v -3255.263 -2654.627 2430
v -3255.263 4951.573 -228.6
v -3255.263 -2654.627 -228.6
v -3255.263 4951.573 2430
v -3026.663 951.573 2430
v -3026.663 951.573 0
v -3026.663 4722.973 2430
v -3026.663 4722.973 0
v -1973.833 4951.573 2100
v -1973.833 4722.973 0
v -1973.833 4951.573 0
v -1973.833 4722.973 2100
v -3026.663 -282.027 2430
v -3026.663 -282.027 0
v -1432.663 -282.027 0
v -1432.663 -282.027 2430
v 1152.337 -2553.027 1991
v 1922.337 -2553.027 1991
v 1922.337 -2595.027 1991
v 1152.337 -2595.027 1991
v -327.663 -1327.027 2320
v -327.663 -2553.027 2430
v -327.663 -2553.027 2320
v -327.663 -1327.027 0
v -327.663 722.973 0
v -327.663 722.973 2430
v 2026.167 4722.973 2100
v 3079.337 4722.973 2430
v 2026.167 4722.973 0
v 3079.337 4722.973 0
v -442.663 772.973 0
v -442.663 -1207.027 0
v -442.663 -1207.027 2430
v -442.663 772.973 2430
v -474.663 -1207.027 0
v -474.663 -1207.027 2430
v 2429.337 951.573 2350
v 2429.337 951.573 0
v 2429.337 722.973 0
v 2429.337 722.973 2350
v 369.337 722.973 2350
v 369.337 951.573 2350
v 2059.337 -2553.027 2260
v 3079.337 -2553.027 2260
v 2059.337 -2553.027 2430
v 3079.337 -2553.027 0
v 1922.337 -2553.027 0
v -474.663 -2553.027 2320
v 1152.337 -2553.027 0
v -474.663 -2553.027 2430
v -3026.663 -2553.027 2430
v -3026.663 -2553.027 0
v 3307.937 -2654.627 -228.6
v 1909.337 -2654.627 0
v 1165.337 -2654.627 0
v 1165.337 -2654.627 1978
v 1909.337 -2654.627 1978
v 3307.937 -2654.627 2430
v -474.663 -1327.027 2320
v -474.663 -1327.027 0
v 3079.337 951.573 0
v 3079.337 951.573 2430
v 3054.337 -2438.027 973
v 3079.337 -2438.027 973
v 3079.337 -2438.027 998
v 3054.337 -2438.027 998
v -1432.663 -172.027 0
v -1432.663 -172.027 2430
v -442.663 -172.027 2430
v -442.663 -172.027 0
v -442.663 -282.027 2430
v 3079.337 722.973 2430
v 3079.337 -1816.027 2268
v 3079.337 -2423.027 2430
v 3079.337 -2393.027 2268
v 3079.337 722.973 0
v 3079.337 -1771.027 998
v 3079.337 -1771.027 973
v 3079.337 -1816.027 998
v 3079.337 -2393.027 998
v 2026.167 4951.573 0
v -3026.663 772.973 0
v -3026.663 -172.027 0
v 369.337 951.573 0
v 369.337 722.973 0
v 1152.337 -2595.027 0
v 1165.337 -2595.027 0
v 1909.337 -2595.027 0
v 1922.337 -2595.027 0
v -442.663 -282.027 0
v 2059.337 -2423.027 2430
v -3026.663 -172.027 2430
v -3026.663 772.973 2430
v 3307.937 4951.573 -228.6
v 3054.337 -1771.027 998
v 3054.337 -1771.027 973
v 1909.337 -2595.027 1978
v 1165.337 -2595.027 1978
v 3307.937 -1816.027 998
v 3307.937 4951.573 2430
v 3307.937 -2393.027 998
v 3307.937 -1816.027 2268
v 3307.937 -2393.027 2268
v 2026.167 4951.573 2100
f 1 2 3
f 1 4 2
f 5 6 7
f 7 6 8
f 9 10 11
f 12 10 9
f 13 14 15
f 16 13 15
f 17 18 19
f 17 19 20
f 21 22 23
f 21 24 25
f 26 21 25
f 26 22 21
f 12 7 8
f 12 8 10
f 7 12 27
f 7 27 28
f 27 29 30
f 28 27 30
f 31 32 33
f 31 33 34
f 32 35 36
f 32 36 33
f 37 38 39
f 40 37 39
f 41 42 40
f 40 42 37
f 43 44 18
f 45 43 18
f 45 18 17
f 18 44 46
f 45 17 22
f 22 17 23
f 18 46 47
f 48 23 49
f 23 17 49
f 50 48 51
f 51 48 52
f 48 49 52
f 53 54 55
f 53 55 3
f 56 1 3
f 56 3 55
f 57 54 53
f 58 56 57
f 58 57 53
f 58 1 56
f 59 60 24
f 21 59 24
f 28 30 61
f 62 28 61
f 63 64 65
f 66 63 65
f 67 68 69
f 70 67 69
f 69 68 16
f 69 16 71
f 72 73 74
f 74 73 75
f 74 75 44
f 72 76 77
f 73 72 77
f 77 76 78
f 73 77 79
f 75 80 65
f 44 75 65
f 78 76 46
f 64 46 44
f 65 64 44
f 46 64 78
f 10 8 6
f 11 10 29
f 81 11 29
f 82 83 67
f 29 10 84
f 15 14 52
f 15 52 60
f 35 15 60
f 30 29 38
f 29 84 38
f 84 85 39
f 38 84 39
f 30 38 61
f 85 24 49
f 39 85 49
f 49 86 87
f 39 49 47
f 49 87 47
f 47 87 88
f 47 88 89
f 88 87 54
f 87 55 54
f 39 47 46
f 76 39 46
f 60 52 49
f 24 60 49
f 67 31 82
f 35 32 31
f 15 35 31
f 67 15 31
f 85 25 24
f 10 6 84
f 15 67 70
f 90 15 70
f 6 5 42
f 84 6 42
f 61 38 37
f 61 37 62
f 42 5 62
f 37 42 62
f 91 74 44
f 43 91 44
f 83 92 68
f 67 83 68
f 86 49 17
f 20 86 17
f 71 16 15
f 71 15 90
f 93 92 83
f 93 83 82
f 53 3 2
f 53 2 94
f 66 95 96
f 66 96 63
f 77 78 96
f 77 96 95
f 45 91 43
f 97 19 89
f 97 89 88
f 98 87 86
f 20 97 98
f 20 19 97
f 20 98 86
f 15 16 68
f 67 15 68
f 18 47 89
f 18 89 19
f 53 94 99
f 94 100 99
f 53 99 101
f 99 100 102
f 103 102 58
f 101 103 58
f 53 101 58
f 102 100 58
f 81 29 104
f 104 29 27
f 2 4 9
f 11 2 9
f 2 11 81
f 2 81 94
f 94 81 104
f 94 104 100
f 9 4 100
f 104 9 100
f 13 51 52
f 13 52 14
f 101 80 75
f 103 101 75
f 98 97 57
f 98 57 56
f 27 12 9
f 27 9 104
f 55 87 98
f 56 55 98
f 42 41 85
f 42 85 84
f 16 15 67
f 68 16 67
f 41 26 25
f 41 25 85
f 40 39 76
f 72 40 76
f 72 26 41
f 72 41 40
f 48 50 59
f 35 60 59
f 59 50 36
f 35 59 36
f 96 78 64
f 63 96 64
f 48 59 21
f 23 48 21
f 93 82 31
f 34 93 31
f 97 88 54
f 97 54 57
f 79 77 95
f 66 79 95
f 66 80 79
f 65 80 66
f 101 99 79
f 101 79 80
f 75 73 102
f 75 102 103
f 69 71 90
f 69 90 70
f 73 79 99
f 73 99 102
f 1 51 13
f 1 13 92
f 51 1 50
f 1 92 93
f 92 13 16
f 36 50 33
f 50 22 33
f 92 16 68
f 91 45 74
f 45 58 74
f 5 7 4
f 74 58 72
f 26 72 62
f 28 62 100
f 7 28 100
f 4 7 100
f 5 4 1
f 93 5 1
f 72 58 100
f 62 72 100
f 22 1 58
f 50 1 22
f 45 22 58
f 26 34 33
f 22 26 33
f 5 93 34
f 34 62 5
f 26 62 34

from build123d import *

# Parameters (mm, degrees)
F0_W      = 1356
F0_H      = 1226
F0_W_2    = 990
F0_H_2    = 1980
F1_DEPTH  = 2430
F2_W      = 147
F2_H      = 1226
F3_DEPTH  = 110
F4_W      = 2060
F4_H      = 228.6
F5_DEPTH  = 80
F6_W      = 577
F6_H      = 1270
F7_DEPTH  = 228.6
F8_W      = 667
F8_H      = 25
F9_DEPTH  = 25
F10_W     = 4000
F10_H     = 2100
F11_DEPTH = 228.6
F12_W     = 744
F12_H     = 1978
F13_DEPTH = 101.6
F14_W     = 770
F14_H     = 1991
F15_DEPTH = 42
F16_W     = 6563.2
F16_H     = 7606.2
F17_DEPTH = 228.6
F19_DEPTH = 1020
F20_W     = 2552
F20_H     = 2271
F21_DEPTH = 2430
F22_W     = 990
F22_H     = 110
F23_DEPTH = 2430
F24_W     = 110
F24_H     = 945
F25_DEPTH = 2430


with BuildPart() as f1:
    # F0 (on Top) → F1 (new body)
    with BuildSketch(Plane.XY):
        Polygon((-3255.263303, 4951.572915), (-3255.263303, 951.572915), (-3255.263303, -2250.100136), (-3255.263303, -2654.627085), (3307.936697, -2654.627085), (3307.936697, 951.572915), (3307.936697, 4951.572915), align=None)
        with Locations((-2348.663303, -1940.027085)):
            Rectangle(F0_W, F0_H, mode=Mode.SUBTRACT)
        Polygon((-3026.663303, -1212.027085), (-3026.663303, -960.060477), (-3026.663303, -282.027085), (-1542.663303, -282.027085), (-1542.663303, -1212.027085), align=None, mode=Mode.SUBTRACT)
        Polygon((-3026.663303, 772.972915), (-2642.663303, 772.972915), (-1542.663303, 772.972915), (-1542.663303, -172.027085), (-3026.663303, -172.027085), (-3026.663303, 0), align=None, mode=Mode.SUBTRACT)
        with Locations((-937.663303, -217.027085)):
            Rectangle(F0_W_2, F0_H_2, mode=Mode.SUBTRACT)
        Polygon((369.336697, 951.572915), (-3026.663303, 951.572915), (-3026.663303, 4722.972915), (3079.336697, 4722.972915), (3079.336697, 951.572915), (2429.336697, 951.572915), (2429.336697, 722.972915), (3079.336697, 722.972915), (3079.336697, -2553.027085), (-1537.663303, -2553.027085), (-1537.663303, -1327.027085), (-327.663303, -1327.027085), (-327.663303, 722.972915), (369.336697, 722.972915), align=None, mode=Mode.SUBTRACT)
    extrude(amount=F1_DEPTH)

    # F2 (on face) → F3 (join)
    with BuildSketch(Plane.XY.offset(2430)):
        with Locations((-401.163303, -1940.027085)):
            Rectangle(F2_W, F2_H)
    extrude(amount=-F3_DEPTH)

    # F4 (on face) → F5 (join)
    with BuildSketch(Plane.XY.offset(2430)):
        with Locations((1399.336697, 837.272915)):
            Rectangle(F4_W, F4_H)
    extrude(amount=-F5_DEPTH)

    # F6 (on face) → F7 (cut, through all)
    with BuildSketch(Plane(origin=(3079.336697, 0, 0), x_dir=(0, -1, 0), z_dir=(-1, 0, 0))):
        with Locations((2104.527085, 1633)):
            Rectangle(F6_W, F6_H)
    extrude(amount=-F7_DEPTH, mode=Mode.SUBTRACT)

    # F8 (on face) → F9 (join)
    with BuildSketch(Plane(origin=(3079.336697, 0, 0), x_dir=(0, -1, 0), z_dir=(-1, 0, 0))):
        with Locations((2104.527085, 985.5)):
            Rectangle(F8_W, F8_H)
    extrude(amount=F9_DEPTH)

    # F10 (on face) → F11 (cut, through all)
    with BuildSketch(Plane.XZ.offset(-4722.972915)):
        with Locations((26.166697, 1050)):
            Rectangle(F10_W, F10_H)
    extrude(amount=-F11_DEPTH, mode=Mode.SUBTRACT)

    # F12 (on face) → F13 (cut, through all)
    with BuildSketch(Plane(origin=(0, -2553.027085, 0), x_dir=(-1, 0, 0), z_dir=(0, 1, 0))):
        with Locations((-1537.336697, 989)):
            Rectangle(F12_W, F12_H)
    extrude(amount=-F13_DEPTH, mode=Mode.SUBTRACT)

    # F14 (on face) → F15 (cut)
    with BuildSketch(Plane(origin=(0, -2553.027085, 0), x_dir=(-1, 0, 0), z_dir=(0, 1, 0))):
        with Locations((-1537.336697, 995.5)):
            Rectangle(F14_W, F14_H)
    extrude(amount=-F15_DEPTH, mode=Mode.SUBTRACT)

    # F16 (on face) → F17 (join)
    with BuildSketch(Plane(origin=(0, 0, 0), x_dir=(1, 0, 0), z_dir=(0, 0, -1))):
        with Locations((26.336697, -1148.472915)):
            Rectangle(F16_W, F16_H)
    extrude(amount=F17_DEPTH)

    # F18 (on face) → F19 (join)
    with BuildSketch(Plane(origin=(3079.336697, 0, 0), x_dir=(0, -1, 0), z_dir=(-1, 0, 0))):
        Polygon((2553.027085, 2260), (2553.027085, 2430), (2423.027085, 2430), align=None)
    extrude(amount=F19_DEPTH)

    # F20 (on face) → F21 (cut, through all)
    with BuildSketch(Plane.XY.offset(2430)):
        with Locations((-1750.663303, -1417.527085)):
            Rectangle(F20_W, F20_H)
    extrude(amount=-F21_DEPTH, mode=Mode.SUBTRACT)

    # F24 (on face) → F25 (cut, through all)
    with BuildSketch(Plane.XY.offset(2430)):
        with Locations((-1487.663303, 300.472915)):
            Rectangle(F24_W, F24_H)
    extrude(amount=-F25_DEPTH, mode=Mode.SUBTRACT)


with BuildPart() as f23:
    # F22 (on face) → F23 (new body, through all)
    with BuildSketch(Plane.XY.offset(2430)):
        with Locations((-937.663303, -227.027085)):
            Rectangle(F22_W, F22_H)
    extrude(amount=-F23_DEPTH)


solid = Compound([f1.part, f23.part])
